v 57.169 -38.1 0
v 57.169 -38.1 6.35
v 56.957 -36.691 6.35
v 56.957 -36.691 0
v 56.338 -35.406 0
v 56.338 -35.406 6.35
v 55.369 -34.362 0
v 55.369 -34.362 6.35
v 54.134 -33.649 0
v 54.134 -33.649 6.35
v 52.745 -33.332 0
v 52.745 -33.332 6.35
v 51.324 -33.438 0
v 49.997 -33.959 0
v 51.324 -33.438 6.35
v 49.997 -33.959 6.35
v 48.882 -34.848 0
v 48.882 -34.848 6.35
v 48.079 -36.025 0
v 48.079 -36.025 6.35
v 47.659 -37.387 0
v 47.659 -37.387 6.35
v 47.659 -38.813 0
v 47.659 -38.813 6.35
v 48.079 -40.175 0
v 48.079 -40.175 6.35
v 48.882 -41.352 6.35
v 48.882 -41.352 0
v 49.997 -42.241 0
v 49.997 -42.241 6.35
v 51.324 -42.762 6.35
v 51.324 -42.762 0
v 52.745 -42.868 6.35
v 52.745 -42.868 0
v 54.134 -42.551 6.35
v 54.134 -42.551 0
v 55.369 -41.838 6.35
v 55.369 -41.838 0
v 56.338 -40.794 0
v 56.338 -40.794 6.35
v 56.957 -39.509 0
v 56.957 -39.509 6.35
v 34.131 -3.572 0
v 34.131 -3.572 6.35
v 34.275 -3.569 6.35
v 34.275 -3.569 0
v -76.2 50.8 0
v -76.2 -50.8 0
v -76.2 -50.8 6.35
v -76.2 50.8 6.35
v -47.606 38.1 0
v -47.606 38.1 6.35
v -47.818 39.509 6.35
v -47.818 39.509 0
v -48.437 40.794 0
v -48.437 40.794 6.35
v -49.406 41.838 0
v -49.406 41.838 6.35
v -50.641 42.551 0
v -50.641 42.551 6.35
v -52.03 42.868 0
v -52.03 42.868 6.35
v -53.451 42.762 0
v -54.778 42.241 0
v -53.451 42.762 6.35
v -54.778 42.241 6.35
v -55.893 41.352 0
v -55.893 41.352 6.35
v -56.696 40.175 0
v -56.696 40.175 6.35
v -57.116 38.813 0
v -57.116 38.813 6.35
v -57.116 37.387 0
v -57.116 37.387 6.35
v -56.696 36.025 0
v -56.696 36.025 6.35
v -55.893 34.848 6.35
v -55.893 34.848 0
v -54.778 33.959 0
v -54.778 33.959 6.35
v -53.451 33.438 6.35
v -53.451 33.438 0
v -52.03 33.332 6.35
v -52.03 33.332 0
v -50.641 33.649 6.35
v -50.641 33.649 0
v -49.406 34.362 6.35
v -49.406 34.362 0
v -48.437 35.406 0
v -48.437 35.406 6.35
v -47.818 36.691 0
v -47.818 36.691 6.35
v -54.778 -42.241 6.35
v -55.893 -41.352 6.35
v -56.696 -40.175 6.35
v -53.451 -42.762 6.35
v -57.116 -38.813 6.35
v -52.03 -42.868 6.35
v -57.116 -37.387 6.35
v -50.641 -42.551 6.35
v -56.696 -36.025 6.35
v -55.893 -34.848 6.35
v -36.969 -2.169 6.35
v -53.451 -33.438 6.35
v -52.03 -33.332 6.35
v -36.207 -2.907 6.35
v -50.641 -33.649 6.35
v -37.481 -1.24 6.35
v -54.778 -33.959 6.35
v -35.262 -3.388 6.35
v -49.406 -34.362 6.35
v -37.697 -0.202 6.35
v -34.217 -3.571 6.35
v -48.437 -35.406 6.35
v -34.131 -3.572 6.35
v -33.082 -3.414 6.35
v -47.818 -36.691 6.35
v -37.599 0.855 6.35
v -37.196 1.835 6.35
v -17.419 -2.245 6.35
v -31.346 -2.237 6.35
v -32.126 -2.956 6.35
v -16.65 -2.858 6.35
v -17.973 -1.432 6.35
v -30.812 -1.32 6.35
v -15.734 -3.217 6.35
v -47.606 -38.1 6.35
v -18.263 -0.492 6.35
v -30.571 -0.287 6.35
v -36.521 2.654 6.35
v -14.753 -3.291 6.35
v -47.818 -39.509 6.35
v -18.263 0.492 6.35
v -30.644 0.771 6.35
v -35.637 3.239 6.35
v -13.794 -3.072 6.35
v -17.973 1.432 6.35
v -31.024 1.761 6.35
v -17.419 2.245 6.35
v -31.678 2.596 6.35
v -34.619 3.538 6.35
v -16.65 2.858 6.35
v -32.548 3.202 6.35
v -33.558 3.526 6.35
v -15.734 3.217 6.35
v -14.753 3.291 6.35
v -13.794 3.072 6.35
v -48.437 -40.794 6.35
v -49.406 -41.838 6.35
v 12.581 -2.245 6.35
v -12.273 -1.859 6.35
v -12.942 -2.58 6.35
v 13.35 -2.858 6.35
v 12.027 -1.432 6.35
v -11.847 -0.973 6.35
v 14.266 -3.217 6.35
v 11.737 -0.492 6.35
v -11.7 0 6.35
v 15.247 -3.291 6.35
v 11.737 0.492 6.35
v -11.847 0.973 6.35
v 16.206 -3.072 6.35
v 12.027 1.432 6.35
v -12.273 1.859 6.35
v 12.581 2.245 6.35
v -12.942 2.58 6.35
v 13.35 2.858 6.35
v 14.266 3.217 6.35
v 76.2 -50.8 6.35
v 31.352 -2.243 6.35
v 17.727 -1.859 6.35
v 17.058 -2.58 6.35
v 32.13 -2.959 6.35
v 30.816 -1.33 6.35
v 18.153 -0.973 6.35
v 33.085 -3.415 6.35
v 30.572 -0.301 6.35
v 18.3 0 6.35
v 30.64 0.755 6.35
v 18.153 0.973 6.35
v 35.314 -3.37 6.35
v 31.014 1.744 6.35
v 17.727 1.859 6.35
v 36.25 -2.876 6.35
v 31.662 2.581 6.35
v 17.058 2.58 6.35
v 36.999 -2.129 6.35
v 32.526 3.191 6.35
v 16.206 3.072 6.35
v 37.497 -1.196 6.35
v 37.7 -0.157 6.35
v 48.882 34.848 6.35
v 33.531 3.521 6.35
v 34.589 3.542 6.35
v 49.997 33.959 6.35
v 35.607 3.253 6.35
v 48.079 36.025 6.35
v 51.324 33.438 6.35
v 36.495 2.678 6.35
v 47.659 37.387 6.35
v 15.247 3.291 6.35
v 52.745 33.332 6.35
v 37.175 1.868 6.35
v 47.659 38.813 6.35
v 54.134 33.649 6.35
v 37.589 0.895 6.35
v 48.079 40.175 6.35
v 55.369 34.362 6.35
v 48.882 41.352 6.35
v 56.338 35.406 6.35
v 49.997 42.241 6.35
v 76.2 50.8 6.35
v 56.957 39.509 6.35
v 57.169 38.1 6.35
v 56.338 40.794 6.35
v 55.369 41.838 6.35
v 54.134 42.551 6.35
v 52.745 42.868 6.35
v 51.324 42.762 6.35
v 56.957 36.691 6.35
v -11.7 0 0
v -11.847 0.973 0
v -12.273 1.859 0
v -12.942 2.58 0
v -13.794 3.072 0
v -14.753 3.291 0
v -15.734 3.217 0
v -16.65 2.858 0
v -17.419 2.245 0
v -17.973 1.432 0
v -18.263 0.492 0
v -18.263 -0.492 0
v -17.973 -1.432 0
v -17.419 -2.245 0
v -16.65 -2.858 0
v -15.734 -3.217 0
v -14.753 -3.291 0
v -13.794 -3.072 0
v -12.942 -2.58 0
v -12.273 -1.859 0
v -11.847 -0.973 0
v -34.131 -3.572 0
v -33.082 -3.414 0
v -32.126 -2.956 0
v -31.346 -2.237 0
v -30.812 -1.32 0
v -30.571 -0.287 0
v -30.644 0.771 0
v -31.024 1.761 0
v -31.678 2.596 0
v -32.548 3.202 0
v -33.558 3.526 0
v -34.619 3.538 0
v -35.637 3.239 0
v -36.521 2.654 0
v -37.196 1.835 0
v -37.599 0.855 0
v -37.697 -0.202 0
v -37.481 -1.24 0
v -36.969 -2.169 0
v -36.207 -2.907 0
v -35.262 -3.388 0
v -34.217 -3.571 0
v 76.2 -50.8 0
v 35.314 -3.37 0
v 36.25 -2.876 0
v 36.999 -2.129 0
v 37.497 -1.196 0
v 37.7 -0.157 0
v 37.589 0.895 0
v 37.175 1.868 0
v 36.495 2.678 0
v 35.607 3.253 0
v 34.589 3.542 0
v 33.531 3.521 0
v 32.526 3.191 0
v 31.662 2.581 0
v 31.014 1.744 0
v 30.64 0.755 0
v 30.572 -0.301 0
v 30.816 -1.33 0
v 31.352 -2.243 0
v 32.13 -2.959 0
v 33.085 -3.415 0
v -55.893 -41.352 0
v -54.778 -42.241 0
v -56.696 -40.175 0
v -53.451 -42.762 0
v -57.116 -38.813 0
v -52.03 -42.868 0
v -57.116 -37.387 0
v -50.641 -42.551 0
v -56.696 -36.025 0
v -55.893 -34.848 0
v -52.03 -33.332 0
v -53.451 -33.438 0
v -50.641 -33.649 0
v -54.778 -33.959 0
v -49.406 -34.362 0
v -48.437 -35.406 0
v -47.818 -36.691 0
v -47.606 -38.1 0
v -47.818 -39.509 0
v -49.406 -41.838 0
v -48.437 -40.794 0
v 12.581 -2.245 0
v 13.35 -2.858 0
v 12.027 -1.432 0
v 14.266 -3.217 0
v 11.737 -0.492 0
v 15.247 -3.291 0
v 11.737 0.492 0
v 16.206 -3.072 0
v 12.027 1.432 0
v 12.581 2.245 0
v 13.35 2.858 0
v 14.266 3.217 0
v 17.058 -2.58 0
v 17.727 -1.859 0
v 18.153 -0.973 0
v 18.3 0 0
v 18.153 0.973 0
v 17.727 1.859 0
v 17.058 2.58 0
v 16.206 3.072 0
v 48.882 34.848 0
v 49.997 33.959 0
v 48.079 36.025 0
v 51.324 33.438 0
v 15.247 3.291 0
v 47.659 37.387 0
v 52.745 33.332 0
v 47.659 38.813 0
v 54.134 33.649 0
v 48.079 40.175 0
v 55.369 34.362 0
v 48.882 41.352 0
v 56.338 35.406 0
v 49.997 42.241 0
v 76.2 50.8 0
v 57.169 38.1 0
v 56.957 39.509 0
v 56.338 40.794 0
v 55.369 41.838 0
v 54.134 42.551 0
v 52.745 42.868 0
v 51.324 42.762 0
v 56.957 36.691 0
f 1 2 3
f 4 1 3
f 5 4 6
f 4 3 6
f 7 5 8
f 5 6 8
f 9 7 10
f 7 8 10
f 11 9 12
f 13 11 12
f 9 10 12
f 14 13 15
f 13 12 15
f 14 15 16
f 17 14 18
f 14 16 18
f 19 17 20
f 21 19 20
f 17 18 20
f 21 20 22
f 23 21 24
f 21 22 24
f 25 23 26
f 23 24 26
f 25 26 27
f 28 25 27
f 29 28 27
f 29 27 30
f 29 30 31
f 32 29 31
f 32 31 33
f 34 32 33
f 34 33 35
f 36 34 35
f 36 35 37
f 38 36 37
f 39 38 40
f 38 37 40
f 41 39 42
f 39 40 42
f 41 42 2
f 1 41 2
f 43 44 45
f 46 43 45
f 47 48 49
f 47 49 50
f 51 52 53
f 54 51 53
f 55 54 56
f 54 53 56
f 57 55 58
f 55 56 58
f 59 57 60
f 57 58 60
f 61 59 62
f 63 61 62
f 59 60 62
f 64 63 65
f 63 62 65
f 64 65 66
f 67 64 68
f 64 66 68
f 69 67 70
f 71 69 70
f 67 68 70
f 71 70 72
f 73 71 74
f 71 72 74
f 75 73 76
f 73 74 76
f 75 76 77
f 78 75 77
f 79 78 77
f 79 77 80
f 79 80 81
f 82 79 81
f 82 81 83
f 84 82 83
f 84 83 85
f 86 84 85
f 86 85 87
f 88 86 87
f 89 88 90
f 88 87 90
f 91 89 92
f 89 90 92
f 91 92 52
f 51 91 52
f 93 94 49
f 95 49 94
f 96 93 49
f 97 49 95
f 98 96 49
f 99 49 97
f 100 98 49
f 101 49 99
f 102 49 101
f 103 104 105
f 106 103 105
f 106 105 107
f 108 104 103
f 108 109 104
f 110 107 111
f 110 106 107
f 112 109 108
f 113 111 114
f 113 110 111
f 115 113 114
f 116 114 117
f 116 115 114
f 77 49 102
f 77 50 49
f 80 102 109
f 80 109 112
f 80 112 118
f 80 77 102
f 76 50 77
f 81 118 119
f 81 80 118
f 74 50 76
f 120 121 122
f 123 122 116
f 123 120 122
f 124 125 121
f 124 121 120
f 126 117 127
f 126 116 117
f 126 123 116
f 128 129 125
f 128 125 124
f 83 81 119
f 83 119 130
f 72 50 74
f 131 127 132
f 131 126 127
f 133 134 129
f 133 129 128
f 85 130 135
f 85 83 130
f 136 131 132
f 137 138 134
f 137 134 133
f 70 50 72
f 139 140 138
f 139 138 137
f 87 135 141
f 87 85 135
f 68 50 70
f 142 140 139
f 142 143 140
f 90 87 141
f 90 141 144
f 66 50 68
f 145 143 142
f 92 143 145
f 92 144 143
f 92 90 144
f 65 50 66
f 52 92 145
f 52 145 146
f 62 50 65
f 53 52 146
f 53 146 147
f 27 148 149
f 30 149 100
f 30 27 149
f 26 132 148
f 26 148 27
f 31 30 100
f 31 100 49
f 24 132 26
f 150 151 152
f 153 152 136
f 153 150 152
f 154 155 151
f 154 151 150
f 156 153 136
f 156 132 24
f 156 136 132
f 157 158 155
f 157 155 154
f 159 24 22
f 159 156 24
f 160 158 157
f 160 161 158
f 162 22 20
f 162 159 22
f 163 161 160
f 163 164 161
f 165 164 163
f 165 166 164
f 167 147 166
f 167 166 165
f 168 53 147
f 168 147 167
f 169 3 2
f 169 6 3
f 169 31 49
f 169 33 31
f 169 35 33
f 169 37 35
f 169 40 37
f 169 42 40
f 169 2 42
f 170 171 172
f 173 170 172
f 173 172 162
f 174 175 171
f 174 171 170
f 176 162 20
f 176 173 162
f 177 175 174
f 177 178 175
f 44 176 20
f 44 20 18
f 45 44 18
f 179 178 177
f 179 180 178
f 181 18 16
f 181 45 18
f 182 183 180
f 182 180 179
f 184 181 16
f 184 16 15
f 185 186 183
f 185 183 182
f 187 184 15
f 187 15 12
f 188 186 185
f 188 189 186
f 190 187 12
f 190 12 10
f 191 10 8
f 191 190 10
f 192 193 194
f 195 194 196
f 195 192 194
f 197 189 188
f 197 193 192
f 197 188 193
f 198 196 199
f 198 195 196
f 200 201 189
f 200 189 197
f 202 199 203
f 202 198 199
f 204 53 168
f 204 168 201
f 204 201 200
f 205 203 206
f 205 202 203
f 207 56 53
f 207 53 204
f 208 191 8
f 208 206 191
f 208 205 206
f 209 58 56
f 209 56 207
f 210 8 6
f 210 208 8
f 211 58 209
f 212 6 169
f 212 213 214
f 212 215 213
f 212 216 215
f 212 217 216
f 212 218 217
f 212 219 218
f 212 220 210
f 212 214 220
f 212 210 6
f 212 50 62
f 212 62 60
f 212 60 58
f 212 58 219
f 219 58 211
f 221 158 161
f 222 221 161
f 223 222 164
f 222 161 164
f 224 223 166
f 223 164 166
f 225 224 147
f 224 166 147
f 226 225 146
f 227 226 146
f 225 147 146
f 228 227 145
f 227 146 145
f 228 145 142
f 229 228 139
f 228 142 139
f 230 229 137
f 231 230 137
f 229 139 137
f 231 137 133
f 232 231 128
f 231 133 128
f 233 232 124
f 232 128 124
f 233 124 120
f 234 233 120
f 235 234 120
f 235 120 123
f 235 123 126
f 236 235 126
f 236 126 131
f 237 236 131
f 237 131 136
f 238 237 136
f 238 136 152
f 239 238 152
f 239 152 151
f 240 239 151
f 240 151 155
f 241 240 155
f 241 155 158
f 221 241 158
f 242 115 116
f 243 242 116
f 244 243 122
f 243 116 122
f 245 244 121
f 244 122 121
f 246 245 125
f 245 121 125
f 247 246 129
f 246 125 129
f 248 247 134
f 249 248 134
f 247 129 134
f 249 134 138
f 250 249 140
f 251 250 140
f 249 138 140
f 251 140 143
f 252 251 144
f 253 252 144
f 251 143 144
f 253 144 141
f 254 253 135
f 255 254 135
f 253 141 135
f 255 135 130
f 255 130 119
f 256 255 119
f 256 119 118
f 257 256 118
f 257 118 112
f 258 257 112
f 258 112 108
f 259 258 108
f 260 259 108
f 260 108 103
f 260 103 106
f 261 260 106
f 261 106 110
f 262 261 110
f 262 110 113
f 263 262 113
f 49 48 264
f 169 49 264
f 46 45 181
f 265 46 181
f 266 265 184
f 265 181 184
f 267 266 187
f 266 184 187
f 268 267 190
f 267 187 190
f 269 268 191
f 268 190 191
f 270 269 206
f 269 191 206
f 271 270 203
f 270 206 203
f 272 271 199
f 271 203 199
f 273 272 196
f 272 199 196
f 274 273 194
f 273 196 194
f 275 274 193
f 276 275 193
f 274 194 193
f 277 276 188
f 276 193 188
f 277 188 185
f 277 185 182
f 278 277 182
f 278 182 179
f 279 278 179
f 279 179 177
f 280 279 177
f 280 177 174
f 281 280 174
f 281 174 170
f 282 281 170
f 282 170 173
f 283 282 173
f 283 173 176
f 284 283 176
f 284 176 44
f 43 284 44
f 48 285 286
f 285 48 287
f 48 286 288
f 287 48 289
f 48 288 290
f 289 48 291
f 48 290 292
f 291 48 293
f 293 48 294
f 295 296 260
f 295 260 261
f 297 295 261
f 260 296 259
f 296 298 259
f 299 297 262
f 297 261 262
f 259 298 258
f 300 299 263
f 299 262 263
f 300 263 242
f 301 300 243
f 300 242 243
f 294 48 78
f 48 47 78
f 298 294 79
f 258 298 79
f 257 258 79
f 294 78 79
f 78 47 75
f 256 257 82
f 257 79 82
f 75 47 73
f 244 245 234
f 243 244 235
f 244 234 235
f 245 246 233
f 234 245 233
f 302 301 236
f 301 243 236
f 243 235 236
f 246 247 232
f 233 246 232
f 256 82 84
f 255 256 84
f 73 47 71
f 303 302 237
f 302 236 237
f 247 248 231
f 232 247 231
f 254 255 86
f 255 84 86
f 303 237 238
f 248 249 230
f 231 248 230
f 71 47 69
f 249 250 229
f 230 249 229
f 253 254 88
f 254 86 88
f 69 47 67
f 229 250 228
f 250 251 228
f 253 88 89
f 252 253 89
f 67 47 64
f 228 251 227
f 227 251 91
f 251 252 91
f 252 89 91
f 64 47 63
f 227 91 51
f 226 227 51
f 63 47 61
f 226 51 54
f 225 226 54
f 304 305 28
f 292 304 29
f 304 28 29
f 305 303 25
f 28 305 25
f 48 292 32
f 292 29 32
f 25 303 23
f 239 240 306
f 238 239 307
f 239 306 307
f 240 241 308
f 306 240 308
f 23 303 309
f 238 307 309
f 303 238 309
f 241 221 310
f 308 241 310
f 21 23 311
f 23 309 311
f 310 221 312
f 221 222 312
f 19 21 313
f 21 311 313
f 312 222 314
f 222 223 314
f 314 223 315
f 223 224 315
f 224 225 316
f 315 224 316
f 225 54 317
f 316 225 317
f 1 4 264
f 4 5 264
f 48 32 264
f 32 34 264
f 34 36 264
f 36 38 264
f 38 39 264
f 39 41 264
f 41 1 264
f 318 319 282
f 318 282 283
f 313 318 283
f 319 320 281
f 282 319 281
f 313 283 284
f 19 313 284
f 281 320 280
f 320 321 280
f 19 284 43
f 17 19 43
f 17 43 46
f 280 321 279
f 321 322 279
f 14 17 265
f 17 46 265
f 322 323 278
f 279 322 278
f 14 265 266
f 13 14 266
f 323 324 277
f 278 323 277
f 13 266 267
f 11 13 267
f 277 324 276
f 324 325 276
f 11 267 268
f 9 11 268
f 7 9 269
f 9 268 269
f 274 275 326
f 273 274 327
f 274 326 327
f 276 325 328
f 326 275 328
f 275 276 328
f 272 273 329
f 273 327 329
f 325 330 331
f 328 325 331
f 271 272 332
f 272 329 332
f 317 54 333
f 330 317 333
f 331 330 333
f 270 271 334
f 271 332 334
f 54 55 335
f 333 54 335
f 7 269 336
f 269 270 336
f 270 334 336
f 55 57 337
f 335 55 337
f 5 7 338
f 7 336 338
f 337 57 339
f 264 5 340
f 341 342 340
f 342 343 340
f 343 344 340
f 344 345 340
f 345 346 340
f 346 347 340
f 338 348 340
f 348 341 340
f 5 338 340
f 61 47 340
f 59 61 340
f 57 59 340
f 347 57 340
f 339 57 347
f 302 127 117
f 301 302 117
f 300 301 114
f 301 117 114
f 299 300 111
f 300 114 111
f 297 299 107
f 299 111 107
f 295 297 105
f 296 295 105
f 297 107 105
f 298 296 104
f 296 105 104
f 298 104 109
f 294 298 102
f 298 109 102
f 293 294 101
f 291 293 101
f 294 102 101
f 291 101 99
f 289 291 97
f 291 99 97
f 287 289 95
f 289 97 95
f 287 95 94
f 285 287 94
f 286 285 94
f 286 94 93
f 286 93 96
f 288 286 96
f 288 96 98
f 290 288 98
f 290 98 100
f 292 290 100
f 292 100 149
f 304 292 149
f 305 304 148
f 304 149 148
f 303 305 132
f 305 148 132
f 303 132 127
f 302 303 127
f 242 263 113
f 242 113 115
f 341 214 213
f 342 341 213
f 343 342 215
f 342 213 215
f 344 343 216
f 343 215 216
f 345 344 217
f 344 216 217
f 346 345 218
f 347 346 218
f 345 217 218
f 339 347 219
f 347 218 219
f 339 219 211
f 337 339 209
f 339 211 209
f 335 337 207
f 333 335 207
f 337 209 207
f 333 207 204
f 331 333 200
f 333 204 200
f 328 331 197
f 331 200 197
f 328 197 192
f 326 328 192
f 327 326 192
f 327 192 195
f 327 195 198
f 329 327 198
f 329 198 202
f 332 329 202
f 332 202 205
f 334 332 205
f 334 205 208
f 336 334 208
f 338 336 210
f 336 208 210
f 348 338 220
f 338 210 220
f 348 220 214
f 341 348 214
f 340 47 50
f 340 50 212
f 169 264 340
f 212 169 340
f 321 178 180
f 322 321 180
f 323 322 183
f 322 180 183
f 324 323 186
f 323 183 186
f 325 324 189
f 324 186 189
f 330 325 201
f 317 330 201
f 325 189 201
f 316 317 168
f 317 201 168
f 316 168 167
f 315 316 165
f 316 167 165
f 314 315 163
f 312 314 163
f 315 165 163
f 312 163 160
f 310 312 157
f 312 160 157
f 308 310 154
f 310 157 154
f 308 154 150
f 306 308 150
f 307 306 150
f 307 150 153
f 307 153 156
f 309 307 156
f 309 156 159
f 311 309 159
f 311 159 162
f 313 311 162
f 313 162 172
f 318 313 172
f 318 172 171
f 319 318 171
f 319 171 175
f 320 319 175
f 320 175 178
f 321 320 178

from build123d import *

# Parameters (mm, degrees)
F0_W     = 152.4
F0_H     = 101.6
F1_DEPTH = 6.35
F2_R     = 4.78155
F3_DEPTH = 6.35
F5_DEPTH = 6.351
F6_R     = 3.3
F7_DEPTH = 6.351


with BuildPart() as f1:
    # F0 (on Top) → F1 (new body)
    with BuildSketch(Plane.XY):
        Rectangle(F0_W, F0_H)
    extrude(amount=F1_DEPTH)

    # F2 (on face) → F3 (cut, through all)
    with BuildSketch(Plane.XY.offset(6.35)):
        with Locations((-52.3875, 38.1)):
            Circle(F2_R)
        with Locations((52.3875, 38.1)):
            Circle(F2_R)
        with Locations((-52.3875, -38.1)):
            Circle(F2_R)
        with Locations((52.3875, -38.1)):
            Circle(F2_R)
    extrude(amount=-F3_DEPTH, mode=Mode.SUBTRACT)

    # F4 (on face) → F5 (cut, through all)
    with BuildSketch(Plane.XY.offset(6.35)):
        with BuildLine():
            Line((-34.217194, -3.570841), (-34.13125, -3.571875))
            ThreePointArc((-34.13125, -3.571875), (-34.088275, 3.571616), (-34.217194, -3.570841))
        make_face()
        with BuildLine():
            Line((34.13125, -3.571875), (34.275124, -3.568976))
            ThreePointArc((34.275124, -3.568976), (34.059298, 3.57115), (34.13125, -3.571875))
        make_face()
    extrude(amount=-F5_DEPTH, mode=Mode.SUBTRACT)

    # F6 (on face) → F7 (cut, through all)
    with BuildSketch(Plane.XY.offset(6.35)):
        with Locations((-15, 0)):
            Circle(F6_R)
        with Locations((15, 0)):
            Circle(F6_R)
    extrude(amount=-F7_DEPTH, mode=Mode.SUBTRACT)


solid = f1.part
